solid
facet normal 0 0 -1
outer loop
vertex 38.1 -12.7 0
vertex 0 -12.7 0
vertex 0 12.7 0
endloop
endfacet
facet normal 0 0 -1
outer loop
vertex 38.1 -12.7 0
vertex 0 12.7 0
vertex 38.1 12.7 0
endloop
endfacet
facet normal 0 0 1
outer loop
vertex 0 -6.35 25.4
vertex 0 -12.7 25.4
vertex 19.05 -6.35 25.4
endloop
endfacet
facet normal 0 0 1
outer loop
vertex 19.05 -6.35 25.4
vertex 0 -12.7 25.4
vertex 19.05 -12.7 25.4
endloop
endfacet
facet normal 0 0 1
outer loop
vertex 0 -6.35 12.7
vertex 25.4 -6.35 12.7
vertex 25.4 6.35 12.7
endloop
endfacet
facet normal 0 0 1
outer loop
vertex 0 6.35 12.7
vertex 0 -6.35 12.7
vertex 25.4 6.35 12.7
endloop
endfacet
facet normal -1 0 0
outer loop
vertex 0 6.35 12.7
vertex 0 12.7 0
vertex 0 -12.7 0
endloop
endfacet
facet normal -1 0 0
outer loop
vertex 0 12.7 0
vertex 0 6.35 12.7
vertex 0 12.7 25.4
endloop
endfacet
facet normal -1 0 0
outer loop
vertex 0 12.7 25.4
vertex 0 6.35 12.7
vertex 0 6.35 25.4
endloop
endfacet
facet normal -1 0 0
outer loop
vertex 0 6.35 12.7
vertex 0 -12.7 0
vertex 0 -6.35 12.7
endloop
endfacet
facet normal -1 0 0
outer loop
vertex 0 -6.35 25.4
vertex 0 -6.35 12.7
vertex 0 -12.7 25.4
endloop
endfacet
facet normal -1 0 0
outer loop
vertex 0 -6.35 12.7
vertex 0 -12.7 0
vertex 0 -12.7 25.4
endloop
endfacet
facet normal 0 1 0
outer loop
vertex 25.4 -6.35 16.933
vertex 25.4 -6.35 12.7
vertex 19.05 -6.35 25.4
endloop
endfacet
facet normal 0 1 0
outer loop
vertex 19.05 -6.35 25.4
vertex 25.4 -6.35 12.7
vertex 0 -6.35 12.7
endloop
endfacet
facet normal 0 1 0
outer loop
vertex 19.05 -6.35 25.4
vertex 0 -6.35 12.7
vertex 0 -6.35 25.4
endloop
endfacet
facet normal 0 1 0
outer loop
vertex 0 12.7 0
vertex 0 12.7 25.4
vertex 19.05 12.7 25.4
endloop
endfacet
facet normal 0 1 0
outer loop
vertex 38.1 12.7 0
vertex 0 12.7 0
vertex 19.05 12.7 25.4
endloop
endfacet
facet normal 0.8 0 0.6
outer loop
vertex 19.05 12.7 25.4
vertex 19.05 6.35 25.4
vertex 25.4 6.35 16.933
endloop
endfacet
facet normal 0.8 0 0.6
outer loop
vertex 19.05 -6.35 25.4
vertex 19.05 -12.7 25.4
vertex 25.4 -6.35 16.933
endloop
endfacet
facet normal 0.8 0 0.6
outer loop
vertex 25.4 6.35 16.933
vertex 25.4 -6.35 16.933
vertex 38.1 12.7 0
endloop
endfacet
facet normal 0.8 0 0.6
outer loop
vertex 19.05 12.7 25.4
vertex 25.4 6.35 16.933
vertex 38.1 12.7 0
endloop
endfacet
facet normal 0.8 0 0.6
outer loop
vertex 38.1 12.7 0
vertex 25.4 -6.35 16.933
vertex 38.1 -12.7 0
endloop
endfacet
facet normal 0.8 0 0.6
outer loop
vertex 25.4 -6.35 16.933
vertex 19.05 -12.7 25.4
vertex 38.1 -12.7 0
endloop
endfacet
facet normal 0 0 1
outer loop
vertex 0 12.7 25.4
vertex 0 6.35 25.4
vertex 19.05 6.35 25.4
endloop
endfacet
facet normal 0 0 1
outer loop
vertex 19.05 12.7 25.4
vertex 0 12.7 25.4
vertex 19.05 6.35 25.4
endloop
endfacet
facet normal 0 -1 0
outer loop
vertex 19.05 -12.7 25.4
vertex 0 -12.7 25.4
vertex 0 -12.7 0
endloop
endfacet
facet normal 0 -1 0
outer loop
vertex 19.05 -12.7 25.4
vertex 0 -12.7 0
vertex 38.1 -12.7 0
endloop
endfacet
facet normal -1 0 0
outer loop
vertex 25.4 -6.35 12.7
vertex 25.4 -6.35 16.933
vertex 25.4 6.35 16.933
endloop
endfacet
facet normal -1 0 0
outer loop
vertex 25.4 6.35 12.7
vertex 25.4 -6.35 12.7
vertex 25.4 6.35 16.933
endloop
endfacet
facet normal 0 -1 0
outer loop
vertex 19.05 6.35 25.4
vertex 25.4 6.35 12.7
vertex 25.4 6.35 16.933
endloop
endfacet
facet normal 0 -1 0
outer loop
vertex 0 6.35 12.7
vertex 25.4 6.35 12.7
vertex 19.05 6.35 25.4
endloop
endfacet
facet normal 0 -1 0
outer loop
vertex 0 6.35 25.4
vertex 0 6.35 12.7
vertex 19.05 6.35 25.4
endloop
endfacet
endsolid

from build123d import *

# Parameters (mm, degrees)
F0_W     = 38.1
F0_H     = 25.4
F1_DEPTH = 12.7
F3_DEPTH = 25.4
F4_W     = 12.7
F4_H     = 12.7
F5_DEPTH = 25.4


with BuildPart() as f1:
    # F0 (on Front) → F1 (new body, symmetric)
    with BuildSketch(Plane.XZ):
        with Locations((19.05, 12.7)):
            Rectangle(F0_W, F0_H)
    extrude(amount=F1_DEPTH, both=True)

    # F2 (on face) → F3 (cut)
    with BuildSketch(Plane.XZ.offset(12.7)):
        Polygon((38.1, 25.4), (19.05, 25.4), (38.1, 0), align=None)
    extrude(amount=-F3_DEPTH, mode=Mode.SUBTRACT)

    # F4 (on Right) → F5 (cut)
    with BuildSketch(Plane.YZ):
        with Locations((0, 19.05)):
            Rectangle(F4_W, F4_H)
    extrude(amount=F5_DEPTH, mode=Mode.SUBTRACT)


solid = f1.part
